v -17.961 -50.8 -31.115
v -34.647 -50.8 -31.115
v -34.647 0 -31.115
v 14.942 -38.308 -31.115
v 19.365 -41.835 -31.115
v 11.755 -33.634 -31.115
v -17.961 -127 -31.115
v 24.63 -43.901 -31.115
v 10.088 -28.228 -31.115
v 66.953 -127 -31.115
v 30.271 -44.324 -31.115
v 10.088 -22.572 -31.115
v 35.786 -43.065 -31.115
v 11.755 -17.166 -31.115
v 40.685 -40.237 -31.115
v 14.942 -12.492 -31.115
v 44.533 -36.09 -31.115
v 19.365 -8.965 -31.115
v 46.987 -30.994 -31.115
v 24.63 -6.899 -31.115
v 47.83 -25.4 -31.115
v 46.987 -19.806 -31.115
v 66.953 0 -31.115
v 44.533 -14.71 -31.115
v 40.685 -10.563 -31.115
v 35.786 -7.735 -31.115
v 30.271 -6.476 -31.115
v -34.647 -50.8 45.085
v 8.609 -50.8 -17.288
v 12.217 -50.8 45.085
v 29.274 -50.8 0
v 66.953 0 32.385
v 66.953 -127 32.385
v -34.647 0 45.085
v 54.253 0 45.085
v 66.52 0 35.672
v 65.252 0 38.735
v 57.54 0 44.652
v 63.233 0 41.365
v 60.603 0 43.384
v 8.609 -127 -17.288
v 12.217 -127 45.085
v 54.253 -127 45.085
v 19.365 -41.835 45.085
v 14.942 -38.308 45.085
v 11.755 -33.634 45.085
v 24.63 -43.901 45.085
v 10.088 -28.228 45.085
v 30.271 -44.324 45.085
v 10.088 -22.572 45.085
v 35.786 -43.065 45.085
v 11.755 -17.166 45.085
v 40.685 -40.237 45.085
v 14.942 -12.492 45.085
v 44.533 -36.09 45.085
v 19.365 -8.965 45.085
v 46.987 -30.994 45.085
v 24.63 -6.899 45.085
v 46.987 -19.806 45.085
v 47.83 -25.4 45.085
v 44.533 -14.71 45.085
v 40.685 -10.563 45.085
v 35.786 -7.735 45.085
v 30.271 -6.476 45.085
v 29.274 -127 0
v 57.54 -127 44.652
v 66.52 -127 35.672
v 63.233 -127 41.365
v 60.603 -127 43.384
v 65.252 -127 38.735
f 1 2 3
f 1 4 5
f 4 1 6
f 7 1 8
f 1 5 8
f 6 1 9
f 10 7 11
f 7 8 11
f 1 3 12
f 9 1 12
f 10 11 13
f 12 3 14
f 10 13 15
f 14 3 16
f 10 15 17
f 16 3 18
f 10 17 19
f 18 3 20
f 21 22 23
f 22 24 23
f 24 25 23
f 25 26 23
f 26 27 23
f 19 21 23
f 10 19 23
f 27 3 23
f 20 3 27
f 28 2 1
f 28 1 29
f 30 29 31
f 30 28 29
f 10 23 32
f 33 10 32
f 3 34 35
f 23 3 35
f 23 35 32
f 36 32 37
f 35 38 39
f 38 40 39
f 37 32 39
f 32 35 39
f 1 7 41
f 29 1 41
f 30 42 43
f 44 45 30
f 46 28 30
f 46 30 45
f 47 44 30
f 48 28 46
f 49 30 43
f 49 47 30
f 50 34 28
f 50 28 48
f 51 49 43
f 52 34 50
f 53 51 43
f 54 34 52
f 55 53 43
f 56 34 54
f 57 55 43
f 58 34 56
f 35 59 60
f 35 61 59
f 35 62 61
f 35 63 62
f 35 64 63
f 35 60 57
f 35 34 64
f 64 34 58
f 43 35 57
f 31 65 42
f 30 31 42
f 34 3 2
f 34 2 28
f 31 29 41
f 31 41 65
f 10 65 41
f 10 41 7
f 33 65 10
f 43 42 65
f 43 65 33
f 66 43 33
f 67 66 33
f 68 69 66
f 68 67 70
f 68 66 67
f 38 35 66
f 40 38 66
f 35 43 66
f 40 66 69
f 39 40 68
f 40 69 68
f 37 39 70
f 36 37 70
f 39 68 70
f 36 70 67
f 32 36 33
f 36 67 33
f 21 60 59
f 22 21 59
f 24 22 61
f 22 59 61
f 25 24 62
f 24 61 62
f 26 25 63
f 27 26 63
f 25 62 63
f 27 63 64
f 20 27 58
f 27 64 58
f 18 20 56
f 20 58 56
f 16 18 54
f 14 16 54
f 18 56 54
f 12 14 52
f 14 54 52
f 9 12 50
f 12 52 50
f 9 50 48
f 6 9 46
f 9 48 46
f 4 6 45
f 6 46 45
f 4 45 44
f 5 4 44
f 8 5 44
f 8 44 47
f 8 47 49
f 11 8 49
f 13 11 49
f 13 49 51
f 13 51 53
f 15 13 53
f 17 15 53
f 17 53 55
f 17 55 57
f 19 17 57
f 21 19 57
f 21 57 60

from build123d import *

# Parameters (mm, degrees)
F0_W     = 101.6
F0_H     = 76.2
F1_DEPTH = 127
F3_DEPTH = 76.2
F4_R     = 12.7
F5_R     = 18.977167
F6_DEPTH = 1270


with BuildPart() as f1:
    # F0 (on Front) → F1 (new body)
    with BuildSketch(Plane.XZ):
        with Locations((16.153131, 6.98517)):
            Rectangle(F0_W, F0_H)
    extrude(amount=F1_DEPTH)

    # F2 (on face) → F3 (cut)
    with BuildSketch(Plane.XZ.offset(127)):
        Polygon((12.216878, 45.08517), (-34.646869, 45.08517), (-34.646869, -31.11483), (-17.961076, -31.11483), (8.608649, -17.288411), (29.273987, 0), align=None)
    extrude(amount=-F3_DEPTH, mode=Mode.SUBTRACT)

    # F4
    f4_edges = [f1.edges().sort_by_distance(p)[0] for p in [
        (66.953131, -63.5, 45.08517),
    ]]
    fillet(f4_edges, radius=F4_R)

    # F5 (on face) → F6 (cut)
    with BuildSketch(Plane.XY.offset(45.08517)):
        with Locations((28.853131, -25.4)):
            Circle(F5_R)
    extrude(amount=-F6_DEPTH, mode=Mode.SUBTRACT)


solid = f1.part
